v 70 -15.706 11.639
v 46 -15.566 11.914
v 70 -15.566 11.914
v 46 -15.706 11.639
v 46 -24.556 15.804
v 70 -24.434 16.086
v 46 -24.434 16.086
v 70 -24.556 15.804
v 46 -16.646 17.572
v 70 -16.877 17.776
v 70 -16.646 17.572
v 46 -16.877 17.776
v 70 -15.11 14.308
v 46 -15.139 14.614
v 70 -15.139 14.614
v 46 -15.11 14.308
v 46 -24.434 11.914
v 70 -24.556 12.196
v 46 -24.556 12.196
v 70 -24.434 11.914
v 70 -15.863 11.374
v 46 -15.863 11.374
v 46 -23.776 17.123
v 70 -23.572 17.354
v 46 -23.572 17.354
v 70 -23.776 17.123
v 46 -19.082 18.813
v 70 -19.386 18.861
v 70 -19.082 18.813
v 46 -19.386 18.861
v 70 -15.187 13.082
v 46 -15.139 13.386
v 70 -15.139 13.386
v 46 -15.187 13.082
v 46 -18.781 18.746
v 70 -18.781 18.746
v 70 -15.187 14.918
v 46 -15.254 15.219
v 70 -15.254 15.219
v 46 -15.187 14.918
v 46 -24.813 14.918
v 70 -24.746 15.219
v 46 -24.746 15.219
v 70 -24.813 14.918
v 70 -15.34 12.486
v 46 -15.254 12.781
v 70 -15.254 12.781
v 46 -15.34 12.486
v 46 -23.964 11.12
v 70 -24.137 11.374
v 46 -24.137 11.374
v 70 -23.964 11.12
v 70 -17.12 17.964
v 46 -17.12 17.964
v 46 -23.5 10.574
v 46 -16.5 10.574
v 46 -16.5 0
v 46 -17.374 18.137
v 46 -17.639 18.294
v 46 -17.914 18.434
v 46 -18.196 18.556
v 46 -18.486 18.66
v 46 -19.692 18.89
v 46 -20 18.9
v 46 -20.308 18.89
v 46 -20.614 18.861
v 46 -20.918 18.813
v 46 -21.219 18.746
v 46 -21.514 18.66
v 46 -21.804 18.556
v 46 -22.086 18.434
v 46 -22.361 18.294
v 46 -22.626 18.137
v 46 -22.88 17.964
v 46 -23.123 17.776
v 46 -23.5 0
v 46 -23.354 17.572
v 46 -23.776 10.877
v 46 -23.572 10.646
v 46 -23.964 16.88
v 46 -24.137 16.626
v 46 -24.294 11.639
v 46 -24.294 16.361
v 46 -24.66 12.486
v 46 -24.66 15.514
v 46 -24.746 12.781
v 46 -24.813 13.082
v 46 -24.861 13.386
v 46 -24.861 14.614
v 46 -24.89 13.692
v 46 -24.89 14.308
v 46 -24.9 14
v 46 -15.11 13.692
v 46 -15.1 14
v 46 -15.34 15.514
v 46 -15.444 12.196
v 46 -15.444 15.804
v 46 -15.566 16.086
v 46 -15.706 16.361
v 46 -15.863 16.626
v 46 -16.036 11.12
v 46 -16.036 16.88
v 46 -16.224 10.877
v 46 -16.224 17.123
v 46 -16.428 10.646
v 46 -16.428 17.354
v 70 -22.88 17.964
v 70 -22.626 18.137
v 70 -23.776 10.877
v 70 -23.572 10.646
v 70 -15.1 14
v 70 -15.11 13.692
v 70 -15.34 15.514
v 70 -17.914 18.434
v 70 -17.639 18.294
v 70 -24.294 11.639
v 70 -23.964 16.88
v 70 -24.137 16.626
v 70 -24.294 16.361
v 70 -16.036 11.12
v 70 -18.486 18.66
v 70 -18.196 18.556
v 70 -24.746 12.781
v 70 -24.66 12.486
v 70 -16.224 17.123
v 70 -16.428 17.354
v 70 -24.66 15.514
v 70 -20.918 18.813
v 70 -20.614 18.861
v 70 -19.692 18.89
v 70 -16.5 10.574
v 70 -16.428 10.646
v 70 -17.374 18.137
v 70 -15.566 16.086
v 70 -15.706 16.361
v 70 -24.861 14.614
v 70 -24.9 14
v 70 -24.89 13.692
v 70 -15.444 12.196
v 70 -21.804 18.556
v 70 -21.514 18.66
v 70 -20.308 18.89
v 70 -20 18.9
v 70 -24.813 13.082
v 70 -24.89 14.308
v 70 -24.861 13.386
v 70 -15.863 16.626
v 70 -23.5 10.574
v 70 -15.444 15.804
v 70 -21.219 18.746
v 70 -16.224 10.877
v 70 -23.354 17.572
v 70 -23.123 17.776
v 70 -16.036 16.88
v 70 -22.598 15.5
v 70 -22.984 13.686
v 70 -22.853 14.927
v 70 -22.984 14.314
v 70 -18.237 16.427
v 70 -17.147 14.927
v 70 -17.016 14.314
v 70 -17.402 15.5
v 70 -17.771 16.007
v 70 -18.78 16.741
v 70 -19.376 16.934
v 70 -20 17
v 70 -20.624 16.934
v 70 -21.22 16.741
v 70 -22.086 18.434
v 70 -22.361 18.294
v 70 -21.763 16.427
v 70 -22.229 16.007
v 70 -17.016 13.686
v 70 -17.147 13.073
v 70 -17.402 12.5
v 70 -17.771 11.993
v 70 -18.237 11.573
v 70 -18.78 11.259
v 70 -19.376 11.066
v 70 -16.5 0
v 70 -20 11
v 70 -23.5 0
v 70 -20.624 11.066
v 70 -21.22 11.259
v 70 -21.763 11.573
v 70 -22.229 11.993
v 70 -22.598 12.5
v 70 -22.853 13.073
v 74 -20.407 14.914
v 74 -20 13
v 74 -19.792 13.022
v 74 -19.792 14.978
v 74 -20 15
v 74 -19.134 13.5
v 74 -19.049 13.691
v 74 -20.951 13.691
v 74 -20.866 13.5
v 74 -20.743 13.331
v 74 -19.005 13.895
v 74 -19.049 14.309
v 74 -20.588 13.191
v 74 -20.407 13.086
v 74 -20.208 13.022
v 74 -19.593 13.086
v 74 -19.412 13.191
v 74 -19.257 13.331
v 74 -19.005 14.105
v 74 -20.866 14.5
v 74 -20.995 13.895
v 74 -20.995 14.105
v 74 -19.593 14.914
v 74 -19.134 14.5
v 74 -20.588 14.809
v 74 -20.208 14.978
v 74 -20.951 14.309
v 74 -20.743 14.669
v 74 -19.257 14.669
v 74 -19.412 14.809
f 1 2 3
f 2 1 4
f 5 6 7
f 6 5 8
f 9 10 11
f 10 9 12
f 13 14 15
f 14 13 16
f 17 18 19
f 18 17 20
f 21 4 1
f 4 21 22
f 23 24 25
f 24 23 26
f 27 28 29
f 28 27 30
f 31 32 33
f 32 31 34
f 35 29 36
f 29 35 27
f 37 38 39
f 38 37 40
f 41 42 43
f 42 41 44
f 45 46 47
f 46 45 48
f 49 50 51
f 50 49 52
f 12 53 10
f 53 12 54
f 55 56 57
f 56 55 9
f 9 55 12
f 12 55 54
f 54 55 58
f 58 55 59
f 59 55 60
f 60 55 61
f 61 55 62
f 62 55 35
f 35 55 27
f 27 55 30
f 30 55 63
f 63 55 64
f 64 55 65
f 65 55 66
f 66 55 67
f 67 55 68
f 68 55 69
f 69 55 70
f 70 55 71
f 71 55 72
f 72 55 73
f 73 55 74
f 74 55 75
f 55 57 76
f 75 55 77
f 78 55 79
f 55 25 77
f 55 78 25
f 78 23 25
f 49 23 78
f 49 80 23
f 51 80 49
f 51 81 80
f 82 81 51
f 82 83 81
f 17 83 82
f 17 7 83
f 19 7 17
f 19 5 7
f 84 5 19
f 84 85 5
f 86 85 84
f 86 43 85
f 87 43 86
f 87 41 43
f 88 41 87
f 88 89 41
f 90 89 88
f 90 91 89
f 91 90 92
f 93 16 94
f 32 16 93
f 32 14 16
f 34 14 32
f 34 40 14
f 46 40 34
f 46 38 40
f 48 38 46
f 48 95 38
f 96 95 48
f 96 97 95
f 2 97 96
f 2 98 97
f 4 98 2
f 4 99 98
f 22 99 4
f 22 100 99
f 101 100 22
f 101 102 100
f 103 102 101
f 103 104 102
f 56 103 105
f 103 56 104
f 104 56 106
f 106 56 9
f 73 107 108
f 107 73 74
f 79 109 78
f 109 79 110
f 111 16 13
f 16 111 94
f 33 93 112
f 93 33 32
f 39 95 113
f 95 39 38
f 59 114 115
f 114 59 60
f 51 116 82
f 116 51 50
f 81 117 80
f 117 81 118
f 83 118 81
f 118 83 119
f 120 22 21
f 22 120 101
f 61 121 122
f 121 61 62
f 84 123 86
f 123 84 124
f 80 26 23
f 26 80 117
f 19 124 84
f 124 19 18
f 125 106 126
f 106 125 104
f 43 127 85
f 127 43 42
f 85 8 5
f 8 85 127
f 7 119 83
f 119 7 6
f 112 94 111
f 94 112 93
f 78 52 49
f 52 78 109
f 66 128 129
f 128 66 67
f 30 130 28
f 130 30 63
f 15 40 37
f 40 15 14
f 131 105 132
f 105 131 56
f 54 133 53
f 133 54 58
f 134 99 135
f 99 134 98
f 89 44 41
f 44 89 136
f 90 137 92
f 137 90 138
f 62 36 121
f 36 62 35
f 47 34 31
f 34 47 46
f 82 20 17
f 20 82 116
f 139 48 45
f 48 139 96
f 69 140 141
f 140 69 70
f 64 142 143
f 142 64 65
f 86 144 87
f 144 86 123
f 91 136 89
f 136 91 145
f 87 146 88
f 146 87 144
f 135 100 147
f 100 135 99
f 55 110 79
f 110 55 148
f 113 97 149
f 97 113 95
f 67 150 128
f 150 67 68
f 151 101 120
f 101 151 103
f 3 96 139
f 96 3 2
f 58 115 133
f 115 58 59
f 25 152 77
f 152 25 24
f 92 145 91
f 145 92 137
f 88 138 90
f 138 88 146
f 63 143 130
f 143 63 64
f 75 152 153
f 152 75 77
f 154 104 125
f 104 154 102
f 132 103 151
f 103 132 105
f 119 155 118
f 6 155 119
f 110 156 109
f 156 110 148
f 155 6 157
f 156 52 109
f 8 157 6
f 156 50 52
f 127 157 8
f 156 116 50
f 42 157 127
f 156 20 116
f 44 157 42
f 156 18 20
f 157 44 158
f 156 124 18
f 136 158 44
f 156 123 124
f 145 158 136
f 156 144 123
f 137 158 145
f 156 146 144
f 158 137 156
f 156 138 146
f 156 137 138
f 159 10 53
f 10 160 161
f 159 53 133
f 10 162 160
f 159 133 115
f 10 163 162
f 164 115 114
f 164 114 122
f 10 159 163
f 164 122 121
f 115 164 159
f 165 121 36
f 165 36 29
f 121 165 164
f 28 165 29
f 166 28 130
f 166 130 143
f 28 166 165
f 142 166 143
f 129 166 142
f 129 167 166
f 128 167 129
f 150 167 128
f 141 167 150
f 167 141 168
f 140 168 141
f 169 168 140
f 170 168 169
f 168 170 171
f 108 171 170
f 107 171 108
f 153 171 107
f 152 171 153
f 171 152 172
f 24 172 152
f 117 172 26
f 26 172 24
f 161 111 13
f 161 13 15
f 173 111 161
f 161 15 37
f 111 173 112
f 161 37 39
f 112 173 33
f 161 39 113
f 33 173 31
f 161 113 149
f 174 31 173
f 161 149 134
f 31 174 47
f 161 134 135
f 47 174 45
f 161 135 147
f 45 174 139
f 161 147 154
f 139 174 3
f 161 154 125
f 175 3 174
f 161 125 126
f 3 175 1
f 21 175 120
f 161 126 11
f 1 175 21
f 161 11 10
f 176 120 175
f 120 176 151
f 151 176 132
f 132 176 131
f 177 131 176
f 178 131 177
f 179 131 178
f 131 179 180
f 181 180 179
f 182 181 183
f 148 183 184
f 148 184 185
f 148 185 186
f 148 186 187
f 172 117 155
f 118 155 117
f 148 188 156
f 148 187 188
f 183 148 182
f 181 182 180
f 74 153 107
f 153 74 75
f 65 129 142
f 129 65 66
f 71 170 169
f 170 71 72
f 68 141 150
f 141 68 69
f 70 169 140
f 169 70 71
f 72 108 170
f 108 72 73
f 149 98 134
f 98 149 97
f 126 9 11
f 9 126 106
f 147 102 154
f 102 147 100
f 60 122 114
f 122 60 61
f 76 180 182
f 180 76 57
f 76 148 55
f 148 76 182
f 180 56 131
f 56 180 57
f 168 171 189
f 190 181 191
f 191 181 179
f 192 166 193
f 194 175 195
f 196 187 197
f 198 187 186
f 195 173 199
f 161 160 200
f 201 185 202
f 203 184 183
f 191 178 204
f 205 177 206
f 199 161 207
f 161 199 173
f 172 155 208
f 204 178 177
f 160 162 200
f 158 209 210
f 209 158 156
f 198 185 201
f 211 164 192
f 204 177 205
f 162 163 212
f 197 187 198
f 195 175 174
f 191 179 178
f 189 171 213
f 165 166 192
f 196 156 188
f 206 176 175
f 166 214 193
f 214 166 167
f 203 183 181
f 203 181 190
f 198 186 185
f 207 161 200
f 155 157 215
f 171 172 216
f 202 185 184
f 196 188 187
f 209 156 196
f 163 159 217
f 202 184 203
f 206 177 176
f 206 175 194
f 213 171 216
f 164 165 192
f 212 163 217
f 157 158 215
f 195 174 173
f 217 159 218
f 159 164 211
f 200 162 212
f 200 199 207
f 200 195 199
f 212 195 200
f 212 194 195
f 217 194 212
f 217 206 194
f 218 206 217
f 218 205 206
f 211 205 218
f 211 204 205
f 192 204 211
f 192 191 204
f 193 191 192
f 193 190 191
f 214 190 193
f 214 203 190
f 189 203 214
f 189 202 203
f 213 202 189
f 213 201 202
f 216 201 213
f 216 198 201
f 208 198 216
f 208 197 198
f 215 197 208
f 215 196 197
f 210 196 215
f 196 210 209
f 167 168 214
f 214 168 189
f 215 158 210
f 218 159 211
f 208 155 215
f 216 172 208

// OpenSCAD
// file: key.scad
module key_shape(height) {
    cylinder(h = height, r = 4.9, $fn = 100);
    translate([0, -3.5, 0])
    cube([14, 7, height]);
}
// main file
use <key.scad>;

height = 15;

union() {
    rotate([180, 90, 0]) translate([-14, 20, -70]) key_shape((height + 9));
    rotate([0, 90, 0]) translate([-14, -20, 70]) cylinder(4, 3, $fn = 30);
}
